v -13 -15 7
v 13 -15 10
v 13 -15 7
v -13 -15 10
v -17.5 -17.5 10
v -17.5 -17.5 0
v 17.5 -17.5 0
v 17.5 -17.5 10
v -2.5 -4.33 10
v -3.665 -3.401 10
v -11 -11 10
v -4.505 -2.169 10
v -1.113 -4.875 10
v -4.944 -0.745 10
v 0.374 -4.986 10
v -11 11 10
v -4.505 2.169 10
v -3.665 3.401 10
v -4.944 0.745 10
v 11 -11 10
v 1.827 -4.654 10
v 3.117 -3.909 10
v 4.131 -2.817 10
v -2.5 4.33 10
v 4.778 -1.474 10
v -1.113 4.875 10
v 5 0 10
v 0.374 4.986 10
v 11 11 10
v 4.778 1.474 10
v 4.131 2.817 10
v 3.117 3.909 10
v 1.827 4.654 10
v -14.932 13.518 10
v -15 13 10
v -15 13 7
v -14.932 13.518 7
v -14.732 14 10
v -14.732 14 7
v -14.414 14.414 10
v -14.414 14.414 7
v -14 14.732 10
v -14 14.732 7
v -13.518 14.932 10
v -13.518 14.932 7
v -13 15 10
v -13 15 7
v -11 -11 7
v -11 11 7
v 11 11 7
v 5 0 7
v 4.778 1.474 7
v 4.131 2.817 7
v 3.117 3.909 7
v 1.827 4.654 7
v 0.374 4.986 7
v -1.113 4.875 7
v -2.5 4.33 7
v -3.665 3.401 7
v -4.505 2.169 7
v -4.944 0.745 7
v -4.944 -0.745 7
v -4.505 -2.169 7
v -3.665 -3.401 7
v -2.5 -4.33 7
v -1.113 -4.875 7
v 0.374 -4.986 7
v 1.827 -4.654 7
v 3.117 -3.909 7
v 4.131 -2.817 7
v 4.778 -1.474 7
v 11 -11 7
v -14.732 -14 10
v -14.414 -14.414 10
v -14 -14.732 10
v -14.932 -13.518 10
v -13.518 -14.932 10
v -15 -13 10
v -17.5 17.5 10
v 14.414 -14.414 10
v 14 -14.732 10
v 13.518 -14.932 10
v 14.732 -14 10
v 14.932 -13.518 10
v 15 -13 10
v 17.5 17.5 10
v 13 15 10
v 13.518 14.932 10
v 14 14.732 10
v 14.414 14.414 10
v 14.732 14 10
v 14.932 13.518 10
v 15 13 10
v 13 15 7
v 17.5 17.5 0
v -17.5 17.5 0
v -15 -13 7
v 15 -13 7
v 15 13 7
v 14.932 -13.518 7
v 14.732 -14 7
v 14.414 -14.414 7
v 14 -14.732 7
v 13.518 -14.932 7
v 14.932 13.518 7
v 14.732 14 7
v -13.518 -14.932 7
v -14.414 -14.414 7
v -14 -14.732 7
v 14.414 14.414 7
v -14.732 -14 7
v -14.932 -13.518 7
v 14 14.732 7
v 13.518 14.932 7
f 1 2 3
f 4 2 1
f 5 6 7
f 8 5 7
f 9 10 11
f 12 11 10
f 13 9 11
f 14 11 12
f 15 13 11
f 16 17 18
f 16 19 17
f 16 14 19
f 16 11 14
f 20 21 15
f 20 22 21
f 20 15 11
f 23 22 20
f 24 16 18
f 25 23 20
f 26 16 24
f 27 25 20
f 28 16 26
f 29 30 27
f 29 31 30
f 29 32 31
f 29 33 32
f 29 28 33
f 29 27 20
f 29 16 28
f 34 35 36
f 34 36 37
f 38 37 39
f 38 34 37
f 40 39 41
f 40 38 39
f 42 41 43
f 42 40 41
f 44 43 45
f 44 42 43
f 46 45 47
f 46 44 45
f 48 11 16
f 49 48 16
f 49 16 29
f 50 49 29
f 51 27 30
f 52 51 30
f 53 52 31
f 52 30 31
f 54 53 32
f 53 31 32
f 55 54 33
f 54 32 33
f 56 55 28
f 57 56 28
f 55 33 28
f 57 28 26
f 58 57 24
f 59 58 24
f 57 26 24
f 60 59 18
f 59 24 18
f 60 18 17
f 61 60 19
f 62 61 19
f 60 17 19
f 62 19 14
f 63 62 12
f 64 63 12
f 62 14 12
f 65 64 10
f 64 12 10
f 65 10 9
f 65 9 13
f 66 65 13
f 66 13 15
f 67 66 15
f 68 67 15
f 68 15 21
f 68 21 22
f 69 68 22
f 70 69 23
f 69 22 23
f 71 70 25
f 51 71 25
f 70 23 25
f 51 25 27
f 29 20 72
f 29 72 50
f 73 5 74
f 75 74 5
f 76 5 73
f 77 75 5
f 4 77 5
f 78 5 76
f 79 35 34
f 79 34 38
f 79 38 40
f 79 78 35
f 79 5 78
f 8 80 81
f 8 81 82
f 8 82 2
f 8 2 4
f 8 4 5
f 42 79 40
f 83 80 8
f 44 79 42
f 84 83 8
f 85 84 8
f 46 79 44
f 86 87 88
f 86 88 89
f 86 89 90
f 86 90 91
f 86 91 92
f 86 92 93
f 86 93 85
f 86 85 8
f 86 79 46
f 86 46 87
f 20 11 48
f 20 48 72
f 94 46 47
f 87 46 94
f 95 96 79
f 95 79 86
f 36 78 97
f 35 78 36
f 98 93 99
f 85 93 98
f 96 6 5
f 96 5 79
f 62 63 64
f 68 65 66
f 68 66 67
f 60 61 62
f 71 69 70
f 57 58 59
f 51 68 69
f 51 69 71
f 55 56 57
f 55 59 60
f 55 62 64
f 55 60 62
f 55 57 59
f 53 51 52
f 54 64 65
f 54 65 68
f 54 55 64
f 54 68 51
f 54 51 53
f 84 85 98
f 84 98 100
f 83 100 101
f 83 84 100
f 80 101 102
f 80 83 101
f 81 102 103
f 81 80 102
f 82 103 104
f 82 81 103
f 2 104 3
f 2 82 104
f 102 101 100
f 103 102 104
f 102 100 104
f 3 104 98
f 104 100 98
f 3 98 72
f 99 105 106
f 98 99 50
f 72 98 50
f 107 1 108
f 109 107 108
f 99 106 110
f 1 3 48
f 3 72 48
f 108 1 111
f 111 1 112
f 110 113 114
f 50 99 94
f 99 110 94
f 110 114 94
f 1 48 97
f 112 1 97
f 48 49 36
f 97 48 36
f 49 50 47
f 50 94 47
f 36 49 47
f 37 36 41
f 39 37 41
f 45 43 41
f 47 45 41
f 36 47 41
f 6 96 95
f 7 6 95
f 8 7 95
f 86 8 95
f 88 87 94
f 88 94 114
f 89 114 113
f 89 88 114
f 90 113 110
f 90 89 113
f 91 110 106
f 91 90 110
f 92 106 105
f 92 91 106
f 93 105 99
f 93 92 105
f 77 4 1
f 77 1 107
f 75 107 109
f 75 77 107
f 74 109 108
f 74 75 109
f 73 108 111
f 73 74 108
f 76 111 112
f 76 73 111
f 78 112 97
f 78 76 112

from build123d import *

# Parameters (mm, degrees)
ESQUISSE2_W                     = 35
ESQUISSE2_H                     = 35
BOSS_EXTRU_2_DEPTH              = 10
ESQUISSE3_W                     = 22
ESQUISSE3_H                     = 22
ENL_V_DE_MAT_EXTRU_MINCE1_DEPTH = 3
ESQUISSE4_R                     = 5
ENL_V_MAT_EXTRU_1_DEPTH         = 3


with BuildPart() as part:
    # Esquisse2 → Boss.-Extru.2 (new body)
    with BuildSketch(Plane.XY):
        Rectangle(ESQUISSE2_W, ESQUISSE2_H)
    extrude(amount=BOSS_EXTRU_2_DEPTH)

    # Esquisse3 → Enlèv. de mat.-Extru.-Mince1 (cut)
    with BuildSketch(Plane.XY.offset(10)):
        with BuildLine():
            Line((-13, 15), (13, 15))
            ThreePointArc((13, 15), (14.414213562, 14.414213562), (15, 13))
            Line((15, 13), (15, -13))
            ThreePointArc((15, -13), (14.414213562, -14.414213562), (13, -15))
            Line((13, -15), (-13, -15))
            ThreePointArc((-13, -15), (-14.414213562, -14.414213562), (-15, -13))
            Line((-15, -13), (-15, 13))
            ThreePointArc((-15, 13), (-14.414213562, 14.414213562), (-13, 15))
        make_face()
        Rectangle(ESQUISSE3_W, ESQUISSE3_H, mode=Mode.SUBTRACT)
    extrude(amount=-ENL_V_DE_MAT_EXTRU_MINCE1_DEPTH, mode=Mode.SUBTRACT)

    # Esquisse4 → Enlèv. mat.-Extru.1 (cut)
    with BuildSketch(Plane.XY.offset(10)):
        Circle(ESQUISSE4_R)
    extrude(amount=-ENL_V_MAT_EXTRU_1_DEPTH, mode=Mode.SUBTRACT)


solid = part.part
